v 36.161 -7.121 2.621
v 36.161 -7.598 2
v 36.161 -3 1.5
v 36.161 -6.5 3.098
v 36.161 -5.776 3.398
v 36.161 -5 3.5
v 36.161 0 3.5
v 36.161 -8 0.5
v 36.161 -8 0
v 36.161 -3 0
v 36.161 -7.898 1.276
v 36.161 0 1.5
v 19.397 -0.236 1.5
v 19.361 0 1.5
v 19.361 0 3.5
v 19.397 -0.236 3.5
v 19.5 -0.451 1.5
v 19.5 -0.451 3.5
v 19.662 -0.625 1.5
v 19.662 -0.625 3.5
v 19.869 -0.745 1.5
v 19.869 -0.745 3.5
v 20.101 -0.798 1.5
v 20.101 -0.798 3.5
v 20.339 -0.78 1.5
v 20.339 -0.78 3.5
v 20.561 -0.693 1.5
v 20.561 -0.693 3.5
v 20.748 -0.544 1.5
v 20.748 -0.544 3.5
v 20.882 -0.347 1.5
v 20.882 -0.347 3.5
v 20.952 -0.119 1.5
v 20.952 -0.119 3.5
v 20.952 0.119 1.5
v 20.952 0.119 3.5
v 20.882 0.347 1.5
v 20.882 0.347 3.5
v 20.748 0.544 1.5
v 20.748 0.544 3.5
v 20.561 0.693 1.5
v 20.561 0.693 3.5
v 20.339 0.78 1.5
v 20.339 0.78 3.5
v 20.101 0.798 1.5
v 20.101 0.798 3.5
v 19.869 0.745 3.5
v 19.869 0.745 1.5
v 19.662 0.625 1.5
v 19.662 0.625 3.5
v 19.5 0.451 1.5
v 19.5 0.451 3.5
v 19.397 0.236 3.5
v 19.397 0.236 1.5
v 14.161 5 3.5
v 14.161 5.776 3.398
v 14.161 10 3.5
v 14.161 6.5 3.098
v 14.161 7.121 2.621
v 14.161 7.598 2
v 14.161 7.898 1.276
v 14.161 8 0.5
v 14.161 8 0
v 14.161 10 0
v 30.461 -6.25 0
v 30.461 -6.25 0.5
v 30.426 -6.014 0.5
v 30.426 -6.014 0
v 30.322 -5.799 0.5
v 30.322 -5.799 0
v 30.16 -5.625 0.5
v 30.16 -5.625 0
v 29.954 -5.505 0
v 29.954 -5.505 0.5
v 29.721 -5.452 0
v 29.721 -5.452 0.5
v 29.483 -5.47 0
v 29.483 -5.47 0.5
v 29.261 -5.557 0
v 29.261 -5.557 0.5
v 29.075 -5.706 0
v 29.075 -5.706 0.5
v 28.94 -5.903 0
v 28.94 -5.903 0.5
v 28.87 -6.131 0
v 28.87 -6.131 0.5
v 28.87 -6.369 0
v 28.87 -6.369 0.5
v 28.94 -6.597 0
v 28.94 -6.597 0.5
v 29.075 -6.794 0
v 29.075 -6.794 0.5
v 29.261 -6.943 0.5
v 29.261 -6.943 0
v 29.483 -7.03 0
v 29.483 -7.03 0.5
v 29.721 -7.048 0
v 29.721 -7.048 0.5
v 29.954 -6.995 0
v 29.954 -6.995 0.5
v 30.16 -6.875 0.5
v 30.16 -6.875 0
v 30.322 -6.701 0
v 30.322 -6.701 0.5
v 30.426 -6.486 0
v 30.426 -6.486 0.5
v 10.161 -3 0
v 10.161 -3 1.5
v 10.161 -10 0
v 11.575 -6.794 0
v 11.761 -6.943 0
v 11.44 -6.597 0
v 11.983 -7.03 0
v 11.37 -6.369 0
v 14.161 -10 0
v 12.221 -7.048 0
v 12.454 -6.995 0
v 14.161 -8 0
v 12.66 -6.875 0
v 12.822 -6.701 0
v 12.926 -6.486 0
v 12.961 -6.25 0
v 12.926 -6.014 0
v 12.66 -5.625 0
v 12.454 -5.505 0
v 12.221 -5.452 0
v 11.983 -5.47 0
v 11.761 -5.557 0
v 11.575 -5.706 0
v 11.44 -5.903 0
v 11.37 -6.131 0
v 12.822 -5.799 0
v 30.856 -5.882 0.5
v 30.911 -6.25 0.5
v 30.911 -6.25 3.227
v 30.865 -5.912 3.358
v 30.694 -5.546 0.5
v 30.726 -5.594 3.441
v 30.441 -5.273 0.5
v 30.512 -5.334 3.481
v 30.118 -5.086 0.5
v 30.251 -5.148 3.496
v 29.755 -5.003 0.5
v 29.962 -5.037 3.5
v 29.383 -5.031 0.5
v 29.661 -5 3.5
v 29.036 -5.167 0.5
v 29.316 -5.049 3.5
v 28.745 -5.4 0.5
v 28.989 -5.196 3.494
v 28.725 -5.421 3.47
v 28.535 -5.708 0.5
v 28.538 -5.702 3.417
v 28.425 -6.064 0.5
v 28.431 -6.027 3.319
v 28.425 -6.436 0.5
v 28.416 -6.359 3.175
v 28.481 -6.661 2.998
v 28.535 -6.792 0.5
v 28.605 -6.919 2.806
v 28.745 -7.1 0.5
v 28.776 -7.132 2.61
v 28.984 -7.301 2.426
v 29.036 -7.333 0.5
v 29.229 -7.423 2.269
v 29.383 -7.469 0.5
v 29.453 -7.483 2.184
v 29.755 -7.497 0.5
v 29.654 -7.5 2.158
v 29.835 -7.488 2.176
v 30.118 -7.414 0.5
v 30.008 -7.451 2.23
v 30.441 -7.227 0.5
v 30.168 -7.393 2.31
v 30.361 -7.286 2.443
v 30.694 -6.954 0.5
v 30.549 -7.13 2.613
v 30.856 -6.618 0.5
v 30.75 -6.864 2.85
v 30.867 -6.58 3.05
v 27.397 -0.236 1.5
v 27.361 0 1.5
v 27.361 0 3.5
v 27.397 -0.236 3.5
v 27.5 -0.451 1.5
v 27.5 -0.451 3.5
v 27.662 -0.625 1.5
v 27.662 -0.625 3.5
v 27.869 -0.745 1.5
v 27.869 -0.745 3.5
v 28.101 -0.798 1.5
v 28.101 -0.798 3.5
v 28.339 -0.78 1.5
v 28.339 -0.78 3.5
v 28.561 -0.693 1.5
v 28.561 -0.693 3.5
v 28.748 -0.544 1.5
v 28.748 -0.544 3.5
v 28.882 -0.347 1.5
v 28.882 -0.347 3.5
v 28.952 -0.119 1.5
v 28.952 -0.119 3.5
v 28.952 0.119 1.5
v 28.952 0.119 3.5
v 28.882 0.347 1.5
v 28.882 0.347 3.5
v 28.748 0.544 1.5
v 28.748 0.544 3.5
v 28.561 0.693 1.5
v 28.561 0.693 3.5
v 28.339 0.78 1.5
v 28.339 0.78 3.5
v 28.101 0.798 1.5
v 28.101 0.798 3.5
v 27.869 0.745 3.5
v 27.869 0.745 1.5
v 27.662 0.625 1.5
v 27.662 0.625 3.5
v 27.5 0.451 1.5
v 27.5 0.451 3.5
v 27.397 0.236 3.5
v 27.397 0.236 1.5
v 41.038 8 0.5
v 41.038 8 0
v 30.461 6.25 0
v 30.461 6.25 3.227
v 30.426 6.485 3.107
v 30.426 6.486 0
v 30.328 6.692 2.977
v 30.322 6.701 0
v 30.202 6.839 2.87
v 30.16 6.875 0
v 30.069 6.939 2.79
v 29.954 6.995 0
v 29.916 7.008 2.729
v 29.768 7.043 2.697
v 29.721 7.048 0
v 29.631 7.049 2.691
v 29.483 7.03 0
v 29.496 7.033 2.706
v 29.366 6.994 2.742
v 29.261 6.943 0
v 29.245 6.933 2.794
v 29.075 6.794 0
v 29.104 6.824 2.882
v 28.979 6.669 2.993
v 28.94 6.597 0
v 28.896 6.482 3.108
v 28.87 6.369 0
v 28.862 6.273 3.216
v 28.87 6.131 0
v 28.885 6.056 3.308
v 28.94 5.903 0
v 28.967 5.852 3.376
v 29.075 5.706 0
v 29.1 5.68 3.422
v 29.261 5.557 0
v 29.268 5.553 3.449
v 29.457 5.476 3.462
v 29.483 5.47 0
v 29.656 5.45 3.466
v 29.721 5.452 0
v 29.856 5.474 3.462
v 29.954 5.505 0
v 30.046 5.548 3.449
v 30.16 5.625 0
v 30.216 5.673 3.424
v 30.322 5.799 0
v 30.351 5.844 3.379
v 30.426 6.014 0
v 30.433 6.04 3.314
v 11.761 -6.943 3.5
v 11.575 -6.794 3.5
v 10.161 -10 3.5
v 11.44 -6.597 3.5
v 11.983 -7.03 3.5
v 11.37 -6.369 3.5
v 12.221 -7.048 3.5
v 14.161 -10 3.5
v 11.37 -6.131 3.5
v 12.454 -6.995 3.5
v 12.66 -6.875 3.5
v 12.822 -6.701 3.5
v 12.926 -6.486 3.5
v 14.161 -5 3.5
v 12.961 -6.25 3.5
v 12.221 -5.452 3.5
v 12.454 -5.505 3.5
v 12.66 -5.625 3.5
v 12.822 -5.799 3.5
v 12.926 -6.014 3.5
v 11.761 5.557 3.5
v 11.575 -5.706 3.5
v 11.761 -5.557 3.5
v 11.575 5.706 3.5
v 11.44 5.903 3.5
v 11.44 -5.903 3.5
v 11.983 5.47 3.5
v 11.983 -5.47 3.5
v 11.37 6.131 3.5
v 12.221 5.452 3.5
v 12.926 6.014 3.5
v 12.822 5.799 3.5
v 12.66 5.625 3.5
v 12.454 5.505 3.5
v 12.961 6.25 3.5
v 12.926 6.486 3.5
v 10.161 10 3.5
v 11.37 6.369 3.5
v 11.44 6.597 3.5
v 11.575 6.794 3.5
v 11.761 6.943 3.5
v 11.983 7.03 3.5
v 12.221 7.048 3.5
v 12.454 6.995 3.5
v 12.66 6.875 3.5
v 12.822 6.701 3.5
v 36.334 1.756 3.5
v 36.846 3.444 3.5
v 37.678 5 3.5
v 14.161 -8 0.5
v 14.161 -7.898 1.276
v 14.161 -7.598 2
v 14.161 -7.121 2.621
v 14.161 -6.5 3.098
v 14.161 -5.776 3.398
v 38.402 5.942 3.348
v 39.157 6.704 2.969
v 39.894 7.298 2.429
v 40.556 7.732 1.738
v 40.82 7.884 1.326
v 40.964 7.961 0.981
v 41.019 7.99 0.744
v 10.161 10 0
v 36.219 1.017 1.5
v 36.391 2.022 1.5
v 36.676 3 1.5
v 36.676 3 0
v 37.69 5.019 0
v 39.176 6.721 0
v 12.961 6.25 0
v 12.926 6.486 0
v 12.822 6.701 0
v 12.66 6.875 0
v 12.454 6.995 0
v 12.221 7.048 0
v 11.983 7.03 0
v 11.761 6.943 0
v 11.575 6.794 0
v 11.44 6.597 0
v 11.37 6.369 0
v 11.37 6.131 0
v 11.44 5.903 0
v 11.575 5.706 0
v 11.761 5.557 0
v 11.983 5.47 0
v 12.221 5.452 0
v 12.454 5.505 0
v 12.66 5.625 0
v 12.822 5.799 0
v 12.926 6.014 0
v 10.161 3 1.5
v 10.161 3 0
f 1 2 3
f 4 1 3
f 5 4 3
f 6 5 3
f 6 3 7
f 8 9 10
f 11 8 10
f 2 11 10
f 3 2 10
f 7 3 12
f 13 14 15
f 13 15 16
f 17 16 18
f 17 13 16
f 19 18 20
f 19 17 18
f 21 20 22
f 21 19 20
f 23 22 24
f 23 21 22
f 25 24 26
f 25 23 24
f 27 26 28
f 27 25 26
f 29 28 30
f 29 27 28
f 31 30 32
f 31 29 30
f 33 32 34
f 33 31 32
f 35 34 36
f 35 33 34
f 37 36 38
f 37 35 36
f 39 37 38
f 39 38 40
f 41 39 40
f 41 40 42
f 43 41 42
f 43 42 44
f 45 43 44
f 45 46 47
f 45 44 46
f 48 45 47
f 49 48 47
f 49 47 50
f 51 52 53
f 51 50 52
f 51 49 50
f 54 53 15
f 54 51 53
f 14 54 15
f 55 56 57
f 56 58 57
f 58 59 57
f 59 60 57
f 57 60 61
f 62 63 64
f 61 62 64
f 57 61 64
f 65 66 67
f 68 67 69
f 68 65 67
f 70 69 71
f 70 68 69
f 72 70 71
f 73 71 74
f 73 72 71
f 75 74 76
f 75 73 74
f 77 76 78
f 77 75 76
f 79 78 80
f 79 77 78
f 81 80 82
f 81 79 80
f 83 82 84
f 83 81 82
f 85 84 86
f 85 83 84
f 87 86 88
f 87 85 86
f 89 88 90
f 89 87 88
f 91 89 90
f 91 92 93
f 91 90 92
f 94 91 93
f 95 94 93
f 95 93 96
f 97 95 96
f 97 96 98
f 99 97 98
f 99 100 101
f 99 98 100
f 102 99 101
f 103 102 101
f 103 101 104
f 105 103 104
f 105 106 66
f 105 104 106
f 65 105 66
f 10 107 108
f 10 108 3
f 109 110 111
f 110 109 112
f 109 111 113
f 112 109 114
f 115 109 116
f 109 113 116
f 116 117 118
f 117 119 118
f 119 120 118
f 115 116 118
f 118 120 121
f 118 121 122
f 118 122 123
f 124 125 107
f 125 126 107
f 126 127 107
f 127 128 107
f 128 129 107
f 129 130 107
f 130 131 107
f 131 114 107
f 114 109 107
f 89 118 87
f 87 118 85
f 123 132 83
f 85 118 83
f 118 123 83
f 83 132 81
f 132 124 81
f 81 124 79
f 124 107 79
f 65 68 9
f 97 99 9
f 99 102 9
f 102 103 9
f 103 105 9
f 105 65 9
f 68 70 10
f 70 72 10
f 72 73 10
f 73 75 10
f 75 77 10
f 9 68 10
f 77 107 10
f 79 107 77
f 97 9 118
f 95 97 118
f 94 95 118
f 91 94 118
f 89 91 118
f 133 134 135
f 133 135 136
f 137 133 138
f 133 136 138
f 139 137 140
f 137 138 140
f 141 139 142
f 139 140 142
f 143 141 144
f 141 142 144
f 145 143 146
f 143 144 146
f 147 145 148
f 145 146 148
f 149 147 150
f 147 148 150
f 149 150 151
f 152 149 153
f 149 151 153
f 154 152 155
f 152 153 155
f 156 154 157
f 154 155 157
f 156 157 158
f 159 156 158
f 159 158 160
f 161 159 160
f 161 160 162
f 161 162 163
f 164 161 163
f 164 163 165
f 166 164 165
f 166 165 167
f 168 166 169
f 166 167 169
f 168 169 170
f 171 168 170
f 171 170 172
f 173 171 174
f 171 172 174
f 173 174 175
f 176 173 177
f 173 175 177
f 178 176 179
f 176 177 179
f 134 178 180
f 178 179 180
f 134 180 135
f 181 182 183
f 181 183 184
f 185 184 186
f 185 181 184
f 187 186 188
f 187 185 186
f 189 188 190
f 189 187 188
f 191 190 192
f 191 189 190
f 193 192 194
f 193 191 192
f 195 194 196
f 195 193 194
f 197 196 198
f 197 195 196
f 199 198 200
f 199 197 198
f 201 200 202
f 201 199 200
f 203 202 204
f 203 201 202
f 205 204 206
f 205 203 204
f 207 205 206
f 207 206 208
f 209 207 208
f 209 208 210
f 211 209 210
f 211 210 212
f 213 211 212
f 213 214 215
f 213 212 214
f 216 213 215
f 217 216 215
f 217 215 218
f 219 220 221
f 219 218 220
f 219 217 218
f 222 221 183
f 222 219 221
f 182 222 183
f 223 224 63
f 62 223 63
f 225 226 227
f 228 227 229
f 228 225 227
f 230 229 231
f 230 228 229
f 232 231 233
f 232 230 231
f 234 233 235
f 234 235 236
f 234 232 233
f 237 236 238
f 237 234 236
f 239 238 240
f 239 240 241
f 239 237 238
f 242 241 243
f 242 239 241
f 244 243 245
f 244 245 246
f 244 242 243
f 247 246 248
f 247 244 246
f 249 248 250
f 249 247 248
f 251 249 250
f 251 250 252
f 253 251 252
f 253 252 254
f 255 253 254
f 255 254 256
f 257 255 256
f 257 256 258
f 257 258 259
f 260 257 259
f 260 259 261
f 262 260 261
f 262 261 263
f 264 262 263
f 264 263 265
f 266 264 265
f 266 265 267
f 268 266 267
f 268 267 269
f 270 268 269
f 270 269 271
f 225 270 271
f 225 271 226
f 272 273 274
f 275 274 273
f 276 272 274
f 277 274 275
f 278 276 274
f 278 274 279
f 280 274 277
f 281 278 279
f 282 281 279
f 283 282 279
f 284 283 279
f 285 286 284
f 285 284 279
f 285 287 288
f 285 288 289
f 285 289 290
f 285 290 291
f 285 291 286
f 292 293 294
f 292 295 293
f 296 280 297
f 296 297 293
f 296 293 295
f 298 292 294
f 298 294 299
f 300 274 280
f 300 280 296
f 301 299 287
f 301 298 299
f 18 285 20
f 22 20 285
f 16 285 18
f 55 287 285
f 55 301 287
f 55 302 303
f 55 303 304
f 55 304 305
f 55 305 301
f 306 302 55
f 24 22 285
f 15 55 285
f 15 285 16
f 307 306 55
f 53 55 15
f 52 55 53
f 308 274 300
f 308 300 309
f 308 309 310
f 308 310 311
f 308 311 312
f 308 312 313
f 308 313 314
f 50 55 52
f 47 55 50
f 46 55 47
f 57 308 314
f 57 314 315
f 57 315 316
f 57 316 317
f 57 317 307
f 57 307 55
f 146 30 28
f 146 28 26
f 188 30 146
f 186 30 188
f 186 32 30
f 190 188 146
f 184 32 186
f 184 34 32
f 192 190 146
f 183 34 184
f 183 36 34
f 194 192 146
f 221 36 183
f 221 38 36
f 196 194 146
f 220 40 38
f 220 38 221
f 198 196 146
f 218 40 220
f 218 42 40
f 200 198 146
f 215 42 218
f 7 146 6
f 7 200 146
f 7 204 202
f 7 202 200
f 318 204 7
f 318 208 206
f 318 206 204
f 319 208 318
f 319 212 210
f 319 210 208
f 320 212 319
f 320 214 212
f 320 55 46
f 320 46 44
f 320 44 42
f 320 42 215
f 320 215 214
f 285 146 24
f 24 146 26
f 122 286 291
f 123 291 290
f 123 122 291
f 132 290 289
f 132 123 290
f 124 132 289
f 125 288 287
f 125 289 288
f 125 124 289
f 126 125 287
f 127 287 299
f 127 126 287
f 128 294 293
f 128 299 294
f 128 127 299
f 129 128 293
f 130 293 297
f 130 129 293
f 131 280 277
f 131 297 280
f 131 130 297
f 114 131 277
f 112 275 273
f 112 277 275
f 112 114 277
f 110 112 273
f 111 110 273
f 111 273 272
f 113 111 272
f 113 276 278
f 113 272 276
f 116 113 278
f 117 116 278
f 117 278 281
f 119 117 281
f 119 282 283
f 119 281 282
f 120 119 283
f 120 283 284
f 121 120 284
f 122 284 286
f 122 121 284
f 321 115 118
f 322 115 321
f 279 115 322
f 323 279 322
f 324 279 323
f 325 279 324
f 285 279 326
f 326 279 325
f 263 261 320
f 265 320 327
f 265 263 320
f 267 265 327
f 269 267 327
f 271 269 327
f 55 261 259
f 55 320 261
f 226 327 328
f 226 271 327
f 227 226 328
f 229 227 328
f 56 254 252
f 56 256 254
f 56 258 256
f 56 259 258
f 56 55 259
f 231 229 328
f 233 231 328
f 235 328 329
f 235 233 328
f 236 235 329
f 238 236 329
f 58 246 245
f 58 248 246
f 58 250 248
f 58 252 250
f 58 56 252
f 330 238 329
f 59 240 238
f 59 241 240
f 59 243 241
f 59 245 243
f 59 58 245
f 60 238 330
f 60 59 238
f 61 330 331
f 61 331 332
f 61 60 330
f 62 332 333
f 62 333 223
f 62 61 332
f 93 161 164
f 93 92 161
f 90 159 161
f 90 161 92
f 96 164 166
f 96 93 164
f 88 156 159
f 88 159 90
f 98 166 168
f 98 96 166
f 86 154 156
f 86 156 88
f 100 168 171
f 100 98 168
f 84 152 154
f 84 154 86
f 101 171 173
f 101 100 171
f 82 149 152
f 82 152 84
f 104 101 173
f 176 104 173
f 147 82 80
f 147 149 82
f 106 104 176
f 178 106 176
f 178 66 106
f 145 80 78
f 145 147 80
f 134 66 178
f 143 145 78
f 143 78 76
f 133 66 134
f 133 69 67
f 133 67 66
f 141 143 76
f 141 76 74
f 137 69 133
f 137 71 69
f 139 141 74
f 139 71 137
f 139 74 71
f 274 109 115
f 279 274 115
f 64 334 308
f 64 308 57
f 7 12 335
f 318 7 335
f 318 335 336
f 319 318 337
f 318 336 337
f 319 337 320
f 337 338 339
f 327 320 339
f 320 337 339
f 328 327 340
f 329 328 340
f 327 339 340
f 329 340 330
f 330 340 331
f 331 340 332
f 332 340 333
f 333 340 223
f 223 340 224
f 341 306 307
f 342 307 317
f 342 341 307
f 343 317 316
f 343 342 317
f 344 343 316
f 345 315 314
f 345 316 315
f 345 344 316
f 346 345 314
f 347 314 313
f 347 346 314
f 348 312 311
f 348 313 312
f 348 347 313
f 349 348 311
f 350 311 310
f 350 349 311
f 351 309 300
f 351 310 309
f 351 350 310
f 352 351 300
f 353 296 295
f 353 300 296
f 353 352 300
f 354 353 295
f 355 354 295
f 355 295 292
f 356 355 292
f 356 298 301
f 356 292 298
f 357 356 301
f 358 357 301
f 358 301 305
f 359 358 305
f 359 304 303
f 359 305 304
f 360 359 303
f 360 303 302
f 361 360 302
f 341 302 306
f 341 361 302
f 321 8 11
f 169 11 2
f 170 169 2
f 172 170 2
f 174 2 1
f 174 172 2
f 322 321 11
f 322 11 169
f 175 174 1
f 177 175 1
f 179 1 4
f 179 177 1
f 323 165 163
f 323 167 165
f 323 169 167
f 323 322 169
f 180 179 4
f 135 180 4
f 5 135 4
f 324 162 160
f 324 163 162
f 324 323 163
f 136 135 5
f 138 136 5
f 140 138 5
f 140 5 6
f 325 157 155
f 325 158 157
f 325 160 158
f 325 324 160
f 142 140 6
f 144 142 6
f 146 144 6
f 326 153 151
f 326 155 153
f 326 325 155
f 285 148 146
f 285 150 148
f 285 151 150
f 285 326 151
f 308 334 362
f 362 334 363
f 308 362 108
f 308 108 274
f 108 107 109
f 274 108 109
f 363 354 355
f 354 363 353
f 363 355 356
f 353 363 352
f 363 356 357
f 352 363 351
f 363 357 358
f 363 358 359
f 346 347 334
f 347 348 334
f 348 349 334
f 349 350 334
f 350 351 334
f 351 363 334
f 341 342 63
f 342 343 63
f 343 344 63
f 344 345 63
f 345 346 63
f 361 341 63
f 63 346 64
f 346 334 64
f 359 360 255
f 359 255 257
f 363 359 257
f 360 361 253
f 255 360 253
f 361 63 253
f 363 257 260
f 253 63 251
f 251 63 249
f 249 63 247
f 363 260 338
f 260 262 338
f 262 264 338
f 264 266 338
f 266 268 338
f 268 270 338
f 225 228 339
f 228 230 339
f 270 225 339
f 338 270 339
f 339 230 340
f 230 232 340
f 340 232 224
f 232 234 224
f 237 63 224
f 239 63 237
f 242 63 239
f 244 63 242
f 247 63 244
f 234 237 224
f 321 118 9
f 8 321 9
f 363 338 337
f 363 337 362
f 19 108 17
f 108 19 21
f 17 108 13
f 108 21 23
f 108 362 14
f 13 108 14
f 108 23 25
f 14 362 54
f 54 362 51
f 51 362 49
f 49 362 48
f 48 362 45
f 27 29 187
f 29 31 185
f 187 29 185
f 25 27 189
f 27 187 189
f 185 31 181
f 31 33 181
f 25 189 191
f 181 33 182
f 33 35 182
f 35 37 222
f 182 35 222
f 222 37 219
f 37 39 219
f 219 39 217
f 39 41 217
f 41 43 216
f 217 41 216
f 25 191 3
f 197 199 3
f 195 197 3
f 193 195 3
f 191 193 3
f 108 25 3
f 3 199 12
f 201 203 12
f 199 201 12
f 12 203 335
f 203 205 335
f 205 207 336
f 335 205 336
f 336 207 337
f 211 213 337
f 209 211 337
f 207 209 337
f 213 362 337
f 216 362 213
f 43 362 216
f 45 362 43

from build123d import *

# Parameters (mm, degrees)
SKETCH1_W           = 4
SKETCH1_H           = 2
BOSS_EXTRUDE1_DEPTH = 3.5
WIRE_CANAL_DEPTH    = 1.5
SKETCH2_R           = 0.8
SCREW_HOLES_DEPTH   = 43.383720665
FILLET1_START       = 14.161255893
FILLET1_DEPTH       = 27.838744107
CUT_EXTRUDE1_START  = 3.5
SKETCH4_R           = 1.25
CUT_EXTRUDE1_DEPTH  = 3


with BuildPart() as part:
    # Sketch1 → Boss-Extrude1 (new body)
    with BuildSketch(Plane.XY):
        with BuildLine():
            Line((10.161255893, 0), (36.161255894, 0))
            ThreePointArc((36.161255894, 0), (37.476597455, 4.684658438), (41.038150268, 8))
            Line((41.038150268, 8), (14.161255893, 8))
            Line((14.161255893, 8), (10.161255893, 8))
            Line((10.161255893, 8), (10.161255893, 0))
        make_face()
        Polygon((36.161255894, -8), (36.161255894, 0), (10.161255893, 0), (10.161255893, -8), (14.161255893, -8), align=None)
        with Locations((12.161255893, 9)):
            Rectangle(SKETCH1_W, SKETCH1_H)
        with Locations((12.161255893, -9)):
            Rectangle(SKETCH1_W, SKETCH1_H)
    extrude(amount=BOSS_EXTRUDE1_DEPTH)

    # Sketch3 → Wire Canal (cut)
    with BuildSketch(Plane.XY):
        Polygon((10.161255893, 3), (10.161255893, 0), (10.161255893, -3), (38.287392351, -3), (38.287392351, 3), align=None)
    extrude(amount=WIRE_CANAL_DEPTH, mode=Mode.SUBTRACT)

    # Sketch2 → Screw Holes (cut, through all)
    with BuildSketch(Plane.XY):
        with Locations(Location((20.161255894, 0, 0), (0, 0, 180))):
            Circle(SKETCH2_R)
        with Locations((12.161255894, -6.25)):
            Circle(SKETCH2_R)
        with Locations((29.661255894, 6.25)):
            Circle(SKETCH2_R)
        with Locations((29.661255894, -6.25)):
            Circle(SKETCH2_R)
        with Locations((12.161255894, 6.25)):
            Circle(SKETCH2_R)
        with Locations(Location((28.161255894, 0, 0), (0, 0, 180))):
            Circle(SKETCH2_R)
    extrude(amount=SCREW_HOLES_DEPTH, mode=Mode.SUBTRACT)

    # Fillet1: read off the stored shape, not the designer's step
    # Fillet1 outline → Fillet1 (cut)
    with BuildSketch(Plane.YZ.offset(FILLET1_START)):
        with BuildLine():
            Line((-8, 3.5), (-8, 0.5))
            ThreePointArc((-8, 0.5), (-7.121320344, 2.621320344), (-5, 3.5))
            Line((-5, 3.5), (-8, 3.5))
        make_face()
        with BuildLine():
            Line((8, 3.5), (5, 3.5))
            ThreePointArc((5, 3.5), (7.121320344, 2.621320344), (8, 0.5))
            Line((8, 0.5), (8, 3.5))
        make_face()
    extrude(amount=FILLET1_DEPTH, mode=Mode.SUBTRACT)

    # Sketch4 → Cut-Extrude1 (cut)
    with BuildSketch(Plane.XY.offset(CUT_EXTRUDE1_START)):
        with Locations((29.661255894, -6.25)):
            Circle(SKETCH4_R)
    extrude(amount=-CUT_EXTRUDE1_DEPTH, mode=Mode.SUBTRACT)


solid = part.part
